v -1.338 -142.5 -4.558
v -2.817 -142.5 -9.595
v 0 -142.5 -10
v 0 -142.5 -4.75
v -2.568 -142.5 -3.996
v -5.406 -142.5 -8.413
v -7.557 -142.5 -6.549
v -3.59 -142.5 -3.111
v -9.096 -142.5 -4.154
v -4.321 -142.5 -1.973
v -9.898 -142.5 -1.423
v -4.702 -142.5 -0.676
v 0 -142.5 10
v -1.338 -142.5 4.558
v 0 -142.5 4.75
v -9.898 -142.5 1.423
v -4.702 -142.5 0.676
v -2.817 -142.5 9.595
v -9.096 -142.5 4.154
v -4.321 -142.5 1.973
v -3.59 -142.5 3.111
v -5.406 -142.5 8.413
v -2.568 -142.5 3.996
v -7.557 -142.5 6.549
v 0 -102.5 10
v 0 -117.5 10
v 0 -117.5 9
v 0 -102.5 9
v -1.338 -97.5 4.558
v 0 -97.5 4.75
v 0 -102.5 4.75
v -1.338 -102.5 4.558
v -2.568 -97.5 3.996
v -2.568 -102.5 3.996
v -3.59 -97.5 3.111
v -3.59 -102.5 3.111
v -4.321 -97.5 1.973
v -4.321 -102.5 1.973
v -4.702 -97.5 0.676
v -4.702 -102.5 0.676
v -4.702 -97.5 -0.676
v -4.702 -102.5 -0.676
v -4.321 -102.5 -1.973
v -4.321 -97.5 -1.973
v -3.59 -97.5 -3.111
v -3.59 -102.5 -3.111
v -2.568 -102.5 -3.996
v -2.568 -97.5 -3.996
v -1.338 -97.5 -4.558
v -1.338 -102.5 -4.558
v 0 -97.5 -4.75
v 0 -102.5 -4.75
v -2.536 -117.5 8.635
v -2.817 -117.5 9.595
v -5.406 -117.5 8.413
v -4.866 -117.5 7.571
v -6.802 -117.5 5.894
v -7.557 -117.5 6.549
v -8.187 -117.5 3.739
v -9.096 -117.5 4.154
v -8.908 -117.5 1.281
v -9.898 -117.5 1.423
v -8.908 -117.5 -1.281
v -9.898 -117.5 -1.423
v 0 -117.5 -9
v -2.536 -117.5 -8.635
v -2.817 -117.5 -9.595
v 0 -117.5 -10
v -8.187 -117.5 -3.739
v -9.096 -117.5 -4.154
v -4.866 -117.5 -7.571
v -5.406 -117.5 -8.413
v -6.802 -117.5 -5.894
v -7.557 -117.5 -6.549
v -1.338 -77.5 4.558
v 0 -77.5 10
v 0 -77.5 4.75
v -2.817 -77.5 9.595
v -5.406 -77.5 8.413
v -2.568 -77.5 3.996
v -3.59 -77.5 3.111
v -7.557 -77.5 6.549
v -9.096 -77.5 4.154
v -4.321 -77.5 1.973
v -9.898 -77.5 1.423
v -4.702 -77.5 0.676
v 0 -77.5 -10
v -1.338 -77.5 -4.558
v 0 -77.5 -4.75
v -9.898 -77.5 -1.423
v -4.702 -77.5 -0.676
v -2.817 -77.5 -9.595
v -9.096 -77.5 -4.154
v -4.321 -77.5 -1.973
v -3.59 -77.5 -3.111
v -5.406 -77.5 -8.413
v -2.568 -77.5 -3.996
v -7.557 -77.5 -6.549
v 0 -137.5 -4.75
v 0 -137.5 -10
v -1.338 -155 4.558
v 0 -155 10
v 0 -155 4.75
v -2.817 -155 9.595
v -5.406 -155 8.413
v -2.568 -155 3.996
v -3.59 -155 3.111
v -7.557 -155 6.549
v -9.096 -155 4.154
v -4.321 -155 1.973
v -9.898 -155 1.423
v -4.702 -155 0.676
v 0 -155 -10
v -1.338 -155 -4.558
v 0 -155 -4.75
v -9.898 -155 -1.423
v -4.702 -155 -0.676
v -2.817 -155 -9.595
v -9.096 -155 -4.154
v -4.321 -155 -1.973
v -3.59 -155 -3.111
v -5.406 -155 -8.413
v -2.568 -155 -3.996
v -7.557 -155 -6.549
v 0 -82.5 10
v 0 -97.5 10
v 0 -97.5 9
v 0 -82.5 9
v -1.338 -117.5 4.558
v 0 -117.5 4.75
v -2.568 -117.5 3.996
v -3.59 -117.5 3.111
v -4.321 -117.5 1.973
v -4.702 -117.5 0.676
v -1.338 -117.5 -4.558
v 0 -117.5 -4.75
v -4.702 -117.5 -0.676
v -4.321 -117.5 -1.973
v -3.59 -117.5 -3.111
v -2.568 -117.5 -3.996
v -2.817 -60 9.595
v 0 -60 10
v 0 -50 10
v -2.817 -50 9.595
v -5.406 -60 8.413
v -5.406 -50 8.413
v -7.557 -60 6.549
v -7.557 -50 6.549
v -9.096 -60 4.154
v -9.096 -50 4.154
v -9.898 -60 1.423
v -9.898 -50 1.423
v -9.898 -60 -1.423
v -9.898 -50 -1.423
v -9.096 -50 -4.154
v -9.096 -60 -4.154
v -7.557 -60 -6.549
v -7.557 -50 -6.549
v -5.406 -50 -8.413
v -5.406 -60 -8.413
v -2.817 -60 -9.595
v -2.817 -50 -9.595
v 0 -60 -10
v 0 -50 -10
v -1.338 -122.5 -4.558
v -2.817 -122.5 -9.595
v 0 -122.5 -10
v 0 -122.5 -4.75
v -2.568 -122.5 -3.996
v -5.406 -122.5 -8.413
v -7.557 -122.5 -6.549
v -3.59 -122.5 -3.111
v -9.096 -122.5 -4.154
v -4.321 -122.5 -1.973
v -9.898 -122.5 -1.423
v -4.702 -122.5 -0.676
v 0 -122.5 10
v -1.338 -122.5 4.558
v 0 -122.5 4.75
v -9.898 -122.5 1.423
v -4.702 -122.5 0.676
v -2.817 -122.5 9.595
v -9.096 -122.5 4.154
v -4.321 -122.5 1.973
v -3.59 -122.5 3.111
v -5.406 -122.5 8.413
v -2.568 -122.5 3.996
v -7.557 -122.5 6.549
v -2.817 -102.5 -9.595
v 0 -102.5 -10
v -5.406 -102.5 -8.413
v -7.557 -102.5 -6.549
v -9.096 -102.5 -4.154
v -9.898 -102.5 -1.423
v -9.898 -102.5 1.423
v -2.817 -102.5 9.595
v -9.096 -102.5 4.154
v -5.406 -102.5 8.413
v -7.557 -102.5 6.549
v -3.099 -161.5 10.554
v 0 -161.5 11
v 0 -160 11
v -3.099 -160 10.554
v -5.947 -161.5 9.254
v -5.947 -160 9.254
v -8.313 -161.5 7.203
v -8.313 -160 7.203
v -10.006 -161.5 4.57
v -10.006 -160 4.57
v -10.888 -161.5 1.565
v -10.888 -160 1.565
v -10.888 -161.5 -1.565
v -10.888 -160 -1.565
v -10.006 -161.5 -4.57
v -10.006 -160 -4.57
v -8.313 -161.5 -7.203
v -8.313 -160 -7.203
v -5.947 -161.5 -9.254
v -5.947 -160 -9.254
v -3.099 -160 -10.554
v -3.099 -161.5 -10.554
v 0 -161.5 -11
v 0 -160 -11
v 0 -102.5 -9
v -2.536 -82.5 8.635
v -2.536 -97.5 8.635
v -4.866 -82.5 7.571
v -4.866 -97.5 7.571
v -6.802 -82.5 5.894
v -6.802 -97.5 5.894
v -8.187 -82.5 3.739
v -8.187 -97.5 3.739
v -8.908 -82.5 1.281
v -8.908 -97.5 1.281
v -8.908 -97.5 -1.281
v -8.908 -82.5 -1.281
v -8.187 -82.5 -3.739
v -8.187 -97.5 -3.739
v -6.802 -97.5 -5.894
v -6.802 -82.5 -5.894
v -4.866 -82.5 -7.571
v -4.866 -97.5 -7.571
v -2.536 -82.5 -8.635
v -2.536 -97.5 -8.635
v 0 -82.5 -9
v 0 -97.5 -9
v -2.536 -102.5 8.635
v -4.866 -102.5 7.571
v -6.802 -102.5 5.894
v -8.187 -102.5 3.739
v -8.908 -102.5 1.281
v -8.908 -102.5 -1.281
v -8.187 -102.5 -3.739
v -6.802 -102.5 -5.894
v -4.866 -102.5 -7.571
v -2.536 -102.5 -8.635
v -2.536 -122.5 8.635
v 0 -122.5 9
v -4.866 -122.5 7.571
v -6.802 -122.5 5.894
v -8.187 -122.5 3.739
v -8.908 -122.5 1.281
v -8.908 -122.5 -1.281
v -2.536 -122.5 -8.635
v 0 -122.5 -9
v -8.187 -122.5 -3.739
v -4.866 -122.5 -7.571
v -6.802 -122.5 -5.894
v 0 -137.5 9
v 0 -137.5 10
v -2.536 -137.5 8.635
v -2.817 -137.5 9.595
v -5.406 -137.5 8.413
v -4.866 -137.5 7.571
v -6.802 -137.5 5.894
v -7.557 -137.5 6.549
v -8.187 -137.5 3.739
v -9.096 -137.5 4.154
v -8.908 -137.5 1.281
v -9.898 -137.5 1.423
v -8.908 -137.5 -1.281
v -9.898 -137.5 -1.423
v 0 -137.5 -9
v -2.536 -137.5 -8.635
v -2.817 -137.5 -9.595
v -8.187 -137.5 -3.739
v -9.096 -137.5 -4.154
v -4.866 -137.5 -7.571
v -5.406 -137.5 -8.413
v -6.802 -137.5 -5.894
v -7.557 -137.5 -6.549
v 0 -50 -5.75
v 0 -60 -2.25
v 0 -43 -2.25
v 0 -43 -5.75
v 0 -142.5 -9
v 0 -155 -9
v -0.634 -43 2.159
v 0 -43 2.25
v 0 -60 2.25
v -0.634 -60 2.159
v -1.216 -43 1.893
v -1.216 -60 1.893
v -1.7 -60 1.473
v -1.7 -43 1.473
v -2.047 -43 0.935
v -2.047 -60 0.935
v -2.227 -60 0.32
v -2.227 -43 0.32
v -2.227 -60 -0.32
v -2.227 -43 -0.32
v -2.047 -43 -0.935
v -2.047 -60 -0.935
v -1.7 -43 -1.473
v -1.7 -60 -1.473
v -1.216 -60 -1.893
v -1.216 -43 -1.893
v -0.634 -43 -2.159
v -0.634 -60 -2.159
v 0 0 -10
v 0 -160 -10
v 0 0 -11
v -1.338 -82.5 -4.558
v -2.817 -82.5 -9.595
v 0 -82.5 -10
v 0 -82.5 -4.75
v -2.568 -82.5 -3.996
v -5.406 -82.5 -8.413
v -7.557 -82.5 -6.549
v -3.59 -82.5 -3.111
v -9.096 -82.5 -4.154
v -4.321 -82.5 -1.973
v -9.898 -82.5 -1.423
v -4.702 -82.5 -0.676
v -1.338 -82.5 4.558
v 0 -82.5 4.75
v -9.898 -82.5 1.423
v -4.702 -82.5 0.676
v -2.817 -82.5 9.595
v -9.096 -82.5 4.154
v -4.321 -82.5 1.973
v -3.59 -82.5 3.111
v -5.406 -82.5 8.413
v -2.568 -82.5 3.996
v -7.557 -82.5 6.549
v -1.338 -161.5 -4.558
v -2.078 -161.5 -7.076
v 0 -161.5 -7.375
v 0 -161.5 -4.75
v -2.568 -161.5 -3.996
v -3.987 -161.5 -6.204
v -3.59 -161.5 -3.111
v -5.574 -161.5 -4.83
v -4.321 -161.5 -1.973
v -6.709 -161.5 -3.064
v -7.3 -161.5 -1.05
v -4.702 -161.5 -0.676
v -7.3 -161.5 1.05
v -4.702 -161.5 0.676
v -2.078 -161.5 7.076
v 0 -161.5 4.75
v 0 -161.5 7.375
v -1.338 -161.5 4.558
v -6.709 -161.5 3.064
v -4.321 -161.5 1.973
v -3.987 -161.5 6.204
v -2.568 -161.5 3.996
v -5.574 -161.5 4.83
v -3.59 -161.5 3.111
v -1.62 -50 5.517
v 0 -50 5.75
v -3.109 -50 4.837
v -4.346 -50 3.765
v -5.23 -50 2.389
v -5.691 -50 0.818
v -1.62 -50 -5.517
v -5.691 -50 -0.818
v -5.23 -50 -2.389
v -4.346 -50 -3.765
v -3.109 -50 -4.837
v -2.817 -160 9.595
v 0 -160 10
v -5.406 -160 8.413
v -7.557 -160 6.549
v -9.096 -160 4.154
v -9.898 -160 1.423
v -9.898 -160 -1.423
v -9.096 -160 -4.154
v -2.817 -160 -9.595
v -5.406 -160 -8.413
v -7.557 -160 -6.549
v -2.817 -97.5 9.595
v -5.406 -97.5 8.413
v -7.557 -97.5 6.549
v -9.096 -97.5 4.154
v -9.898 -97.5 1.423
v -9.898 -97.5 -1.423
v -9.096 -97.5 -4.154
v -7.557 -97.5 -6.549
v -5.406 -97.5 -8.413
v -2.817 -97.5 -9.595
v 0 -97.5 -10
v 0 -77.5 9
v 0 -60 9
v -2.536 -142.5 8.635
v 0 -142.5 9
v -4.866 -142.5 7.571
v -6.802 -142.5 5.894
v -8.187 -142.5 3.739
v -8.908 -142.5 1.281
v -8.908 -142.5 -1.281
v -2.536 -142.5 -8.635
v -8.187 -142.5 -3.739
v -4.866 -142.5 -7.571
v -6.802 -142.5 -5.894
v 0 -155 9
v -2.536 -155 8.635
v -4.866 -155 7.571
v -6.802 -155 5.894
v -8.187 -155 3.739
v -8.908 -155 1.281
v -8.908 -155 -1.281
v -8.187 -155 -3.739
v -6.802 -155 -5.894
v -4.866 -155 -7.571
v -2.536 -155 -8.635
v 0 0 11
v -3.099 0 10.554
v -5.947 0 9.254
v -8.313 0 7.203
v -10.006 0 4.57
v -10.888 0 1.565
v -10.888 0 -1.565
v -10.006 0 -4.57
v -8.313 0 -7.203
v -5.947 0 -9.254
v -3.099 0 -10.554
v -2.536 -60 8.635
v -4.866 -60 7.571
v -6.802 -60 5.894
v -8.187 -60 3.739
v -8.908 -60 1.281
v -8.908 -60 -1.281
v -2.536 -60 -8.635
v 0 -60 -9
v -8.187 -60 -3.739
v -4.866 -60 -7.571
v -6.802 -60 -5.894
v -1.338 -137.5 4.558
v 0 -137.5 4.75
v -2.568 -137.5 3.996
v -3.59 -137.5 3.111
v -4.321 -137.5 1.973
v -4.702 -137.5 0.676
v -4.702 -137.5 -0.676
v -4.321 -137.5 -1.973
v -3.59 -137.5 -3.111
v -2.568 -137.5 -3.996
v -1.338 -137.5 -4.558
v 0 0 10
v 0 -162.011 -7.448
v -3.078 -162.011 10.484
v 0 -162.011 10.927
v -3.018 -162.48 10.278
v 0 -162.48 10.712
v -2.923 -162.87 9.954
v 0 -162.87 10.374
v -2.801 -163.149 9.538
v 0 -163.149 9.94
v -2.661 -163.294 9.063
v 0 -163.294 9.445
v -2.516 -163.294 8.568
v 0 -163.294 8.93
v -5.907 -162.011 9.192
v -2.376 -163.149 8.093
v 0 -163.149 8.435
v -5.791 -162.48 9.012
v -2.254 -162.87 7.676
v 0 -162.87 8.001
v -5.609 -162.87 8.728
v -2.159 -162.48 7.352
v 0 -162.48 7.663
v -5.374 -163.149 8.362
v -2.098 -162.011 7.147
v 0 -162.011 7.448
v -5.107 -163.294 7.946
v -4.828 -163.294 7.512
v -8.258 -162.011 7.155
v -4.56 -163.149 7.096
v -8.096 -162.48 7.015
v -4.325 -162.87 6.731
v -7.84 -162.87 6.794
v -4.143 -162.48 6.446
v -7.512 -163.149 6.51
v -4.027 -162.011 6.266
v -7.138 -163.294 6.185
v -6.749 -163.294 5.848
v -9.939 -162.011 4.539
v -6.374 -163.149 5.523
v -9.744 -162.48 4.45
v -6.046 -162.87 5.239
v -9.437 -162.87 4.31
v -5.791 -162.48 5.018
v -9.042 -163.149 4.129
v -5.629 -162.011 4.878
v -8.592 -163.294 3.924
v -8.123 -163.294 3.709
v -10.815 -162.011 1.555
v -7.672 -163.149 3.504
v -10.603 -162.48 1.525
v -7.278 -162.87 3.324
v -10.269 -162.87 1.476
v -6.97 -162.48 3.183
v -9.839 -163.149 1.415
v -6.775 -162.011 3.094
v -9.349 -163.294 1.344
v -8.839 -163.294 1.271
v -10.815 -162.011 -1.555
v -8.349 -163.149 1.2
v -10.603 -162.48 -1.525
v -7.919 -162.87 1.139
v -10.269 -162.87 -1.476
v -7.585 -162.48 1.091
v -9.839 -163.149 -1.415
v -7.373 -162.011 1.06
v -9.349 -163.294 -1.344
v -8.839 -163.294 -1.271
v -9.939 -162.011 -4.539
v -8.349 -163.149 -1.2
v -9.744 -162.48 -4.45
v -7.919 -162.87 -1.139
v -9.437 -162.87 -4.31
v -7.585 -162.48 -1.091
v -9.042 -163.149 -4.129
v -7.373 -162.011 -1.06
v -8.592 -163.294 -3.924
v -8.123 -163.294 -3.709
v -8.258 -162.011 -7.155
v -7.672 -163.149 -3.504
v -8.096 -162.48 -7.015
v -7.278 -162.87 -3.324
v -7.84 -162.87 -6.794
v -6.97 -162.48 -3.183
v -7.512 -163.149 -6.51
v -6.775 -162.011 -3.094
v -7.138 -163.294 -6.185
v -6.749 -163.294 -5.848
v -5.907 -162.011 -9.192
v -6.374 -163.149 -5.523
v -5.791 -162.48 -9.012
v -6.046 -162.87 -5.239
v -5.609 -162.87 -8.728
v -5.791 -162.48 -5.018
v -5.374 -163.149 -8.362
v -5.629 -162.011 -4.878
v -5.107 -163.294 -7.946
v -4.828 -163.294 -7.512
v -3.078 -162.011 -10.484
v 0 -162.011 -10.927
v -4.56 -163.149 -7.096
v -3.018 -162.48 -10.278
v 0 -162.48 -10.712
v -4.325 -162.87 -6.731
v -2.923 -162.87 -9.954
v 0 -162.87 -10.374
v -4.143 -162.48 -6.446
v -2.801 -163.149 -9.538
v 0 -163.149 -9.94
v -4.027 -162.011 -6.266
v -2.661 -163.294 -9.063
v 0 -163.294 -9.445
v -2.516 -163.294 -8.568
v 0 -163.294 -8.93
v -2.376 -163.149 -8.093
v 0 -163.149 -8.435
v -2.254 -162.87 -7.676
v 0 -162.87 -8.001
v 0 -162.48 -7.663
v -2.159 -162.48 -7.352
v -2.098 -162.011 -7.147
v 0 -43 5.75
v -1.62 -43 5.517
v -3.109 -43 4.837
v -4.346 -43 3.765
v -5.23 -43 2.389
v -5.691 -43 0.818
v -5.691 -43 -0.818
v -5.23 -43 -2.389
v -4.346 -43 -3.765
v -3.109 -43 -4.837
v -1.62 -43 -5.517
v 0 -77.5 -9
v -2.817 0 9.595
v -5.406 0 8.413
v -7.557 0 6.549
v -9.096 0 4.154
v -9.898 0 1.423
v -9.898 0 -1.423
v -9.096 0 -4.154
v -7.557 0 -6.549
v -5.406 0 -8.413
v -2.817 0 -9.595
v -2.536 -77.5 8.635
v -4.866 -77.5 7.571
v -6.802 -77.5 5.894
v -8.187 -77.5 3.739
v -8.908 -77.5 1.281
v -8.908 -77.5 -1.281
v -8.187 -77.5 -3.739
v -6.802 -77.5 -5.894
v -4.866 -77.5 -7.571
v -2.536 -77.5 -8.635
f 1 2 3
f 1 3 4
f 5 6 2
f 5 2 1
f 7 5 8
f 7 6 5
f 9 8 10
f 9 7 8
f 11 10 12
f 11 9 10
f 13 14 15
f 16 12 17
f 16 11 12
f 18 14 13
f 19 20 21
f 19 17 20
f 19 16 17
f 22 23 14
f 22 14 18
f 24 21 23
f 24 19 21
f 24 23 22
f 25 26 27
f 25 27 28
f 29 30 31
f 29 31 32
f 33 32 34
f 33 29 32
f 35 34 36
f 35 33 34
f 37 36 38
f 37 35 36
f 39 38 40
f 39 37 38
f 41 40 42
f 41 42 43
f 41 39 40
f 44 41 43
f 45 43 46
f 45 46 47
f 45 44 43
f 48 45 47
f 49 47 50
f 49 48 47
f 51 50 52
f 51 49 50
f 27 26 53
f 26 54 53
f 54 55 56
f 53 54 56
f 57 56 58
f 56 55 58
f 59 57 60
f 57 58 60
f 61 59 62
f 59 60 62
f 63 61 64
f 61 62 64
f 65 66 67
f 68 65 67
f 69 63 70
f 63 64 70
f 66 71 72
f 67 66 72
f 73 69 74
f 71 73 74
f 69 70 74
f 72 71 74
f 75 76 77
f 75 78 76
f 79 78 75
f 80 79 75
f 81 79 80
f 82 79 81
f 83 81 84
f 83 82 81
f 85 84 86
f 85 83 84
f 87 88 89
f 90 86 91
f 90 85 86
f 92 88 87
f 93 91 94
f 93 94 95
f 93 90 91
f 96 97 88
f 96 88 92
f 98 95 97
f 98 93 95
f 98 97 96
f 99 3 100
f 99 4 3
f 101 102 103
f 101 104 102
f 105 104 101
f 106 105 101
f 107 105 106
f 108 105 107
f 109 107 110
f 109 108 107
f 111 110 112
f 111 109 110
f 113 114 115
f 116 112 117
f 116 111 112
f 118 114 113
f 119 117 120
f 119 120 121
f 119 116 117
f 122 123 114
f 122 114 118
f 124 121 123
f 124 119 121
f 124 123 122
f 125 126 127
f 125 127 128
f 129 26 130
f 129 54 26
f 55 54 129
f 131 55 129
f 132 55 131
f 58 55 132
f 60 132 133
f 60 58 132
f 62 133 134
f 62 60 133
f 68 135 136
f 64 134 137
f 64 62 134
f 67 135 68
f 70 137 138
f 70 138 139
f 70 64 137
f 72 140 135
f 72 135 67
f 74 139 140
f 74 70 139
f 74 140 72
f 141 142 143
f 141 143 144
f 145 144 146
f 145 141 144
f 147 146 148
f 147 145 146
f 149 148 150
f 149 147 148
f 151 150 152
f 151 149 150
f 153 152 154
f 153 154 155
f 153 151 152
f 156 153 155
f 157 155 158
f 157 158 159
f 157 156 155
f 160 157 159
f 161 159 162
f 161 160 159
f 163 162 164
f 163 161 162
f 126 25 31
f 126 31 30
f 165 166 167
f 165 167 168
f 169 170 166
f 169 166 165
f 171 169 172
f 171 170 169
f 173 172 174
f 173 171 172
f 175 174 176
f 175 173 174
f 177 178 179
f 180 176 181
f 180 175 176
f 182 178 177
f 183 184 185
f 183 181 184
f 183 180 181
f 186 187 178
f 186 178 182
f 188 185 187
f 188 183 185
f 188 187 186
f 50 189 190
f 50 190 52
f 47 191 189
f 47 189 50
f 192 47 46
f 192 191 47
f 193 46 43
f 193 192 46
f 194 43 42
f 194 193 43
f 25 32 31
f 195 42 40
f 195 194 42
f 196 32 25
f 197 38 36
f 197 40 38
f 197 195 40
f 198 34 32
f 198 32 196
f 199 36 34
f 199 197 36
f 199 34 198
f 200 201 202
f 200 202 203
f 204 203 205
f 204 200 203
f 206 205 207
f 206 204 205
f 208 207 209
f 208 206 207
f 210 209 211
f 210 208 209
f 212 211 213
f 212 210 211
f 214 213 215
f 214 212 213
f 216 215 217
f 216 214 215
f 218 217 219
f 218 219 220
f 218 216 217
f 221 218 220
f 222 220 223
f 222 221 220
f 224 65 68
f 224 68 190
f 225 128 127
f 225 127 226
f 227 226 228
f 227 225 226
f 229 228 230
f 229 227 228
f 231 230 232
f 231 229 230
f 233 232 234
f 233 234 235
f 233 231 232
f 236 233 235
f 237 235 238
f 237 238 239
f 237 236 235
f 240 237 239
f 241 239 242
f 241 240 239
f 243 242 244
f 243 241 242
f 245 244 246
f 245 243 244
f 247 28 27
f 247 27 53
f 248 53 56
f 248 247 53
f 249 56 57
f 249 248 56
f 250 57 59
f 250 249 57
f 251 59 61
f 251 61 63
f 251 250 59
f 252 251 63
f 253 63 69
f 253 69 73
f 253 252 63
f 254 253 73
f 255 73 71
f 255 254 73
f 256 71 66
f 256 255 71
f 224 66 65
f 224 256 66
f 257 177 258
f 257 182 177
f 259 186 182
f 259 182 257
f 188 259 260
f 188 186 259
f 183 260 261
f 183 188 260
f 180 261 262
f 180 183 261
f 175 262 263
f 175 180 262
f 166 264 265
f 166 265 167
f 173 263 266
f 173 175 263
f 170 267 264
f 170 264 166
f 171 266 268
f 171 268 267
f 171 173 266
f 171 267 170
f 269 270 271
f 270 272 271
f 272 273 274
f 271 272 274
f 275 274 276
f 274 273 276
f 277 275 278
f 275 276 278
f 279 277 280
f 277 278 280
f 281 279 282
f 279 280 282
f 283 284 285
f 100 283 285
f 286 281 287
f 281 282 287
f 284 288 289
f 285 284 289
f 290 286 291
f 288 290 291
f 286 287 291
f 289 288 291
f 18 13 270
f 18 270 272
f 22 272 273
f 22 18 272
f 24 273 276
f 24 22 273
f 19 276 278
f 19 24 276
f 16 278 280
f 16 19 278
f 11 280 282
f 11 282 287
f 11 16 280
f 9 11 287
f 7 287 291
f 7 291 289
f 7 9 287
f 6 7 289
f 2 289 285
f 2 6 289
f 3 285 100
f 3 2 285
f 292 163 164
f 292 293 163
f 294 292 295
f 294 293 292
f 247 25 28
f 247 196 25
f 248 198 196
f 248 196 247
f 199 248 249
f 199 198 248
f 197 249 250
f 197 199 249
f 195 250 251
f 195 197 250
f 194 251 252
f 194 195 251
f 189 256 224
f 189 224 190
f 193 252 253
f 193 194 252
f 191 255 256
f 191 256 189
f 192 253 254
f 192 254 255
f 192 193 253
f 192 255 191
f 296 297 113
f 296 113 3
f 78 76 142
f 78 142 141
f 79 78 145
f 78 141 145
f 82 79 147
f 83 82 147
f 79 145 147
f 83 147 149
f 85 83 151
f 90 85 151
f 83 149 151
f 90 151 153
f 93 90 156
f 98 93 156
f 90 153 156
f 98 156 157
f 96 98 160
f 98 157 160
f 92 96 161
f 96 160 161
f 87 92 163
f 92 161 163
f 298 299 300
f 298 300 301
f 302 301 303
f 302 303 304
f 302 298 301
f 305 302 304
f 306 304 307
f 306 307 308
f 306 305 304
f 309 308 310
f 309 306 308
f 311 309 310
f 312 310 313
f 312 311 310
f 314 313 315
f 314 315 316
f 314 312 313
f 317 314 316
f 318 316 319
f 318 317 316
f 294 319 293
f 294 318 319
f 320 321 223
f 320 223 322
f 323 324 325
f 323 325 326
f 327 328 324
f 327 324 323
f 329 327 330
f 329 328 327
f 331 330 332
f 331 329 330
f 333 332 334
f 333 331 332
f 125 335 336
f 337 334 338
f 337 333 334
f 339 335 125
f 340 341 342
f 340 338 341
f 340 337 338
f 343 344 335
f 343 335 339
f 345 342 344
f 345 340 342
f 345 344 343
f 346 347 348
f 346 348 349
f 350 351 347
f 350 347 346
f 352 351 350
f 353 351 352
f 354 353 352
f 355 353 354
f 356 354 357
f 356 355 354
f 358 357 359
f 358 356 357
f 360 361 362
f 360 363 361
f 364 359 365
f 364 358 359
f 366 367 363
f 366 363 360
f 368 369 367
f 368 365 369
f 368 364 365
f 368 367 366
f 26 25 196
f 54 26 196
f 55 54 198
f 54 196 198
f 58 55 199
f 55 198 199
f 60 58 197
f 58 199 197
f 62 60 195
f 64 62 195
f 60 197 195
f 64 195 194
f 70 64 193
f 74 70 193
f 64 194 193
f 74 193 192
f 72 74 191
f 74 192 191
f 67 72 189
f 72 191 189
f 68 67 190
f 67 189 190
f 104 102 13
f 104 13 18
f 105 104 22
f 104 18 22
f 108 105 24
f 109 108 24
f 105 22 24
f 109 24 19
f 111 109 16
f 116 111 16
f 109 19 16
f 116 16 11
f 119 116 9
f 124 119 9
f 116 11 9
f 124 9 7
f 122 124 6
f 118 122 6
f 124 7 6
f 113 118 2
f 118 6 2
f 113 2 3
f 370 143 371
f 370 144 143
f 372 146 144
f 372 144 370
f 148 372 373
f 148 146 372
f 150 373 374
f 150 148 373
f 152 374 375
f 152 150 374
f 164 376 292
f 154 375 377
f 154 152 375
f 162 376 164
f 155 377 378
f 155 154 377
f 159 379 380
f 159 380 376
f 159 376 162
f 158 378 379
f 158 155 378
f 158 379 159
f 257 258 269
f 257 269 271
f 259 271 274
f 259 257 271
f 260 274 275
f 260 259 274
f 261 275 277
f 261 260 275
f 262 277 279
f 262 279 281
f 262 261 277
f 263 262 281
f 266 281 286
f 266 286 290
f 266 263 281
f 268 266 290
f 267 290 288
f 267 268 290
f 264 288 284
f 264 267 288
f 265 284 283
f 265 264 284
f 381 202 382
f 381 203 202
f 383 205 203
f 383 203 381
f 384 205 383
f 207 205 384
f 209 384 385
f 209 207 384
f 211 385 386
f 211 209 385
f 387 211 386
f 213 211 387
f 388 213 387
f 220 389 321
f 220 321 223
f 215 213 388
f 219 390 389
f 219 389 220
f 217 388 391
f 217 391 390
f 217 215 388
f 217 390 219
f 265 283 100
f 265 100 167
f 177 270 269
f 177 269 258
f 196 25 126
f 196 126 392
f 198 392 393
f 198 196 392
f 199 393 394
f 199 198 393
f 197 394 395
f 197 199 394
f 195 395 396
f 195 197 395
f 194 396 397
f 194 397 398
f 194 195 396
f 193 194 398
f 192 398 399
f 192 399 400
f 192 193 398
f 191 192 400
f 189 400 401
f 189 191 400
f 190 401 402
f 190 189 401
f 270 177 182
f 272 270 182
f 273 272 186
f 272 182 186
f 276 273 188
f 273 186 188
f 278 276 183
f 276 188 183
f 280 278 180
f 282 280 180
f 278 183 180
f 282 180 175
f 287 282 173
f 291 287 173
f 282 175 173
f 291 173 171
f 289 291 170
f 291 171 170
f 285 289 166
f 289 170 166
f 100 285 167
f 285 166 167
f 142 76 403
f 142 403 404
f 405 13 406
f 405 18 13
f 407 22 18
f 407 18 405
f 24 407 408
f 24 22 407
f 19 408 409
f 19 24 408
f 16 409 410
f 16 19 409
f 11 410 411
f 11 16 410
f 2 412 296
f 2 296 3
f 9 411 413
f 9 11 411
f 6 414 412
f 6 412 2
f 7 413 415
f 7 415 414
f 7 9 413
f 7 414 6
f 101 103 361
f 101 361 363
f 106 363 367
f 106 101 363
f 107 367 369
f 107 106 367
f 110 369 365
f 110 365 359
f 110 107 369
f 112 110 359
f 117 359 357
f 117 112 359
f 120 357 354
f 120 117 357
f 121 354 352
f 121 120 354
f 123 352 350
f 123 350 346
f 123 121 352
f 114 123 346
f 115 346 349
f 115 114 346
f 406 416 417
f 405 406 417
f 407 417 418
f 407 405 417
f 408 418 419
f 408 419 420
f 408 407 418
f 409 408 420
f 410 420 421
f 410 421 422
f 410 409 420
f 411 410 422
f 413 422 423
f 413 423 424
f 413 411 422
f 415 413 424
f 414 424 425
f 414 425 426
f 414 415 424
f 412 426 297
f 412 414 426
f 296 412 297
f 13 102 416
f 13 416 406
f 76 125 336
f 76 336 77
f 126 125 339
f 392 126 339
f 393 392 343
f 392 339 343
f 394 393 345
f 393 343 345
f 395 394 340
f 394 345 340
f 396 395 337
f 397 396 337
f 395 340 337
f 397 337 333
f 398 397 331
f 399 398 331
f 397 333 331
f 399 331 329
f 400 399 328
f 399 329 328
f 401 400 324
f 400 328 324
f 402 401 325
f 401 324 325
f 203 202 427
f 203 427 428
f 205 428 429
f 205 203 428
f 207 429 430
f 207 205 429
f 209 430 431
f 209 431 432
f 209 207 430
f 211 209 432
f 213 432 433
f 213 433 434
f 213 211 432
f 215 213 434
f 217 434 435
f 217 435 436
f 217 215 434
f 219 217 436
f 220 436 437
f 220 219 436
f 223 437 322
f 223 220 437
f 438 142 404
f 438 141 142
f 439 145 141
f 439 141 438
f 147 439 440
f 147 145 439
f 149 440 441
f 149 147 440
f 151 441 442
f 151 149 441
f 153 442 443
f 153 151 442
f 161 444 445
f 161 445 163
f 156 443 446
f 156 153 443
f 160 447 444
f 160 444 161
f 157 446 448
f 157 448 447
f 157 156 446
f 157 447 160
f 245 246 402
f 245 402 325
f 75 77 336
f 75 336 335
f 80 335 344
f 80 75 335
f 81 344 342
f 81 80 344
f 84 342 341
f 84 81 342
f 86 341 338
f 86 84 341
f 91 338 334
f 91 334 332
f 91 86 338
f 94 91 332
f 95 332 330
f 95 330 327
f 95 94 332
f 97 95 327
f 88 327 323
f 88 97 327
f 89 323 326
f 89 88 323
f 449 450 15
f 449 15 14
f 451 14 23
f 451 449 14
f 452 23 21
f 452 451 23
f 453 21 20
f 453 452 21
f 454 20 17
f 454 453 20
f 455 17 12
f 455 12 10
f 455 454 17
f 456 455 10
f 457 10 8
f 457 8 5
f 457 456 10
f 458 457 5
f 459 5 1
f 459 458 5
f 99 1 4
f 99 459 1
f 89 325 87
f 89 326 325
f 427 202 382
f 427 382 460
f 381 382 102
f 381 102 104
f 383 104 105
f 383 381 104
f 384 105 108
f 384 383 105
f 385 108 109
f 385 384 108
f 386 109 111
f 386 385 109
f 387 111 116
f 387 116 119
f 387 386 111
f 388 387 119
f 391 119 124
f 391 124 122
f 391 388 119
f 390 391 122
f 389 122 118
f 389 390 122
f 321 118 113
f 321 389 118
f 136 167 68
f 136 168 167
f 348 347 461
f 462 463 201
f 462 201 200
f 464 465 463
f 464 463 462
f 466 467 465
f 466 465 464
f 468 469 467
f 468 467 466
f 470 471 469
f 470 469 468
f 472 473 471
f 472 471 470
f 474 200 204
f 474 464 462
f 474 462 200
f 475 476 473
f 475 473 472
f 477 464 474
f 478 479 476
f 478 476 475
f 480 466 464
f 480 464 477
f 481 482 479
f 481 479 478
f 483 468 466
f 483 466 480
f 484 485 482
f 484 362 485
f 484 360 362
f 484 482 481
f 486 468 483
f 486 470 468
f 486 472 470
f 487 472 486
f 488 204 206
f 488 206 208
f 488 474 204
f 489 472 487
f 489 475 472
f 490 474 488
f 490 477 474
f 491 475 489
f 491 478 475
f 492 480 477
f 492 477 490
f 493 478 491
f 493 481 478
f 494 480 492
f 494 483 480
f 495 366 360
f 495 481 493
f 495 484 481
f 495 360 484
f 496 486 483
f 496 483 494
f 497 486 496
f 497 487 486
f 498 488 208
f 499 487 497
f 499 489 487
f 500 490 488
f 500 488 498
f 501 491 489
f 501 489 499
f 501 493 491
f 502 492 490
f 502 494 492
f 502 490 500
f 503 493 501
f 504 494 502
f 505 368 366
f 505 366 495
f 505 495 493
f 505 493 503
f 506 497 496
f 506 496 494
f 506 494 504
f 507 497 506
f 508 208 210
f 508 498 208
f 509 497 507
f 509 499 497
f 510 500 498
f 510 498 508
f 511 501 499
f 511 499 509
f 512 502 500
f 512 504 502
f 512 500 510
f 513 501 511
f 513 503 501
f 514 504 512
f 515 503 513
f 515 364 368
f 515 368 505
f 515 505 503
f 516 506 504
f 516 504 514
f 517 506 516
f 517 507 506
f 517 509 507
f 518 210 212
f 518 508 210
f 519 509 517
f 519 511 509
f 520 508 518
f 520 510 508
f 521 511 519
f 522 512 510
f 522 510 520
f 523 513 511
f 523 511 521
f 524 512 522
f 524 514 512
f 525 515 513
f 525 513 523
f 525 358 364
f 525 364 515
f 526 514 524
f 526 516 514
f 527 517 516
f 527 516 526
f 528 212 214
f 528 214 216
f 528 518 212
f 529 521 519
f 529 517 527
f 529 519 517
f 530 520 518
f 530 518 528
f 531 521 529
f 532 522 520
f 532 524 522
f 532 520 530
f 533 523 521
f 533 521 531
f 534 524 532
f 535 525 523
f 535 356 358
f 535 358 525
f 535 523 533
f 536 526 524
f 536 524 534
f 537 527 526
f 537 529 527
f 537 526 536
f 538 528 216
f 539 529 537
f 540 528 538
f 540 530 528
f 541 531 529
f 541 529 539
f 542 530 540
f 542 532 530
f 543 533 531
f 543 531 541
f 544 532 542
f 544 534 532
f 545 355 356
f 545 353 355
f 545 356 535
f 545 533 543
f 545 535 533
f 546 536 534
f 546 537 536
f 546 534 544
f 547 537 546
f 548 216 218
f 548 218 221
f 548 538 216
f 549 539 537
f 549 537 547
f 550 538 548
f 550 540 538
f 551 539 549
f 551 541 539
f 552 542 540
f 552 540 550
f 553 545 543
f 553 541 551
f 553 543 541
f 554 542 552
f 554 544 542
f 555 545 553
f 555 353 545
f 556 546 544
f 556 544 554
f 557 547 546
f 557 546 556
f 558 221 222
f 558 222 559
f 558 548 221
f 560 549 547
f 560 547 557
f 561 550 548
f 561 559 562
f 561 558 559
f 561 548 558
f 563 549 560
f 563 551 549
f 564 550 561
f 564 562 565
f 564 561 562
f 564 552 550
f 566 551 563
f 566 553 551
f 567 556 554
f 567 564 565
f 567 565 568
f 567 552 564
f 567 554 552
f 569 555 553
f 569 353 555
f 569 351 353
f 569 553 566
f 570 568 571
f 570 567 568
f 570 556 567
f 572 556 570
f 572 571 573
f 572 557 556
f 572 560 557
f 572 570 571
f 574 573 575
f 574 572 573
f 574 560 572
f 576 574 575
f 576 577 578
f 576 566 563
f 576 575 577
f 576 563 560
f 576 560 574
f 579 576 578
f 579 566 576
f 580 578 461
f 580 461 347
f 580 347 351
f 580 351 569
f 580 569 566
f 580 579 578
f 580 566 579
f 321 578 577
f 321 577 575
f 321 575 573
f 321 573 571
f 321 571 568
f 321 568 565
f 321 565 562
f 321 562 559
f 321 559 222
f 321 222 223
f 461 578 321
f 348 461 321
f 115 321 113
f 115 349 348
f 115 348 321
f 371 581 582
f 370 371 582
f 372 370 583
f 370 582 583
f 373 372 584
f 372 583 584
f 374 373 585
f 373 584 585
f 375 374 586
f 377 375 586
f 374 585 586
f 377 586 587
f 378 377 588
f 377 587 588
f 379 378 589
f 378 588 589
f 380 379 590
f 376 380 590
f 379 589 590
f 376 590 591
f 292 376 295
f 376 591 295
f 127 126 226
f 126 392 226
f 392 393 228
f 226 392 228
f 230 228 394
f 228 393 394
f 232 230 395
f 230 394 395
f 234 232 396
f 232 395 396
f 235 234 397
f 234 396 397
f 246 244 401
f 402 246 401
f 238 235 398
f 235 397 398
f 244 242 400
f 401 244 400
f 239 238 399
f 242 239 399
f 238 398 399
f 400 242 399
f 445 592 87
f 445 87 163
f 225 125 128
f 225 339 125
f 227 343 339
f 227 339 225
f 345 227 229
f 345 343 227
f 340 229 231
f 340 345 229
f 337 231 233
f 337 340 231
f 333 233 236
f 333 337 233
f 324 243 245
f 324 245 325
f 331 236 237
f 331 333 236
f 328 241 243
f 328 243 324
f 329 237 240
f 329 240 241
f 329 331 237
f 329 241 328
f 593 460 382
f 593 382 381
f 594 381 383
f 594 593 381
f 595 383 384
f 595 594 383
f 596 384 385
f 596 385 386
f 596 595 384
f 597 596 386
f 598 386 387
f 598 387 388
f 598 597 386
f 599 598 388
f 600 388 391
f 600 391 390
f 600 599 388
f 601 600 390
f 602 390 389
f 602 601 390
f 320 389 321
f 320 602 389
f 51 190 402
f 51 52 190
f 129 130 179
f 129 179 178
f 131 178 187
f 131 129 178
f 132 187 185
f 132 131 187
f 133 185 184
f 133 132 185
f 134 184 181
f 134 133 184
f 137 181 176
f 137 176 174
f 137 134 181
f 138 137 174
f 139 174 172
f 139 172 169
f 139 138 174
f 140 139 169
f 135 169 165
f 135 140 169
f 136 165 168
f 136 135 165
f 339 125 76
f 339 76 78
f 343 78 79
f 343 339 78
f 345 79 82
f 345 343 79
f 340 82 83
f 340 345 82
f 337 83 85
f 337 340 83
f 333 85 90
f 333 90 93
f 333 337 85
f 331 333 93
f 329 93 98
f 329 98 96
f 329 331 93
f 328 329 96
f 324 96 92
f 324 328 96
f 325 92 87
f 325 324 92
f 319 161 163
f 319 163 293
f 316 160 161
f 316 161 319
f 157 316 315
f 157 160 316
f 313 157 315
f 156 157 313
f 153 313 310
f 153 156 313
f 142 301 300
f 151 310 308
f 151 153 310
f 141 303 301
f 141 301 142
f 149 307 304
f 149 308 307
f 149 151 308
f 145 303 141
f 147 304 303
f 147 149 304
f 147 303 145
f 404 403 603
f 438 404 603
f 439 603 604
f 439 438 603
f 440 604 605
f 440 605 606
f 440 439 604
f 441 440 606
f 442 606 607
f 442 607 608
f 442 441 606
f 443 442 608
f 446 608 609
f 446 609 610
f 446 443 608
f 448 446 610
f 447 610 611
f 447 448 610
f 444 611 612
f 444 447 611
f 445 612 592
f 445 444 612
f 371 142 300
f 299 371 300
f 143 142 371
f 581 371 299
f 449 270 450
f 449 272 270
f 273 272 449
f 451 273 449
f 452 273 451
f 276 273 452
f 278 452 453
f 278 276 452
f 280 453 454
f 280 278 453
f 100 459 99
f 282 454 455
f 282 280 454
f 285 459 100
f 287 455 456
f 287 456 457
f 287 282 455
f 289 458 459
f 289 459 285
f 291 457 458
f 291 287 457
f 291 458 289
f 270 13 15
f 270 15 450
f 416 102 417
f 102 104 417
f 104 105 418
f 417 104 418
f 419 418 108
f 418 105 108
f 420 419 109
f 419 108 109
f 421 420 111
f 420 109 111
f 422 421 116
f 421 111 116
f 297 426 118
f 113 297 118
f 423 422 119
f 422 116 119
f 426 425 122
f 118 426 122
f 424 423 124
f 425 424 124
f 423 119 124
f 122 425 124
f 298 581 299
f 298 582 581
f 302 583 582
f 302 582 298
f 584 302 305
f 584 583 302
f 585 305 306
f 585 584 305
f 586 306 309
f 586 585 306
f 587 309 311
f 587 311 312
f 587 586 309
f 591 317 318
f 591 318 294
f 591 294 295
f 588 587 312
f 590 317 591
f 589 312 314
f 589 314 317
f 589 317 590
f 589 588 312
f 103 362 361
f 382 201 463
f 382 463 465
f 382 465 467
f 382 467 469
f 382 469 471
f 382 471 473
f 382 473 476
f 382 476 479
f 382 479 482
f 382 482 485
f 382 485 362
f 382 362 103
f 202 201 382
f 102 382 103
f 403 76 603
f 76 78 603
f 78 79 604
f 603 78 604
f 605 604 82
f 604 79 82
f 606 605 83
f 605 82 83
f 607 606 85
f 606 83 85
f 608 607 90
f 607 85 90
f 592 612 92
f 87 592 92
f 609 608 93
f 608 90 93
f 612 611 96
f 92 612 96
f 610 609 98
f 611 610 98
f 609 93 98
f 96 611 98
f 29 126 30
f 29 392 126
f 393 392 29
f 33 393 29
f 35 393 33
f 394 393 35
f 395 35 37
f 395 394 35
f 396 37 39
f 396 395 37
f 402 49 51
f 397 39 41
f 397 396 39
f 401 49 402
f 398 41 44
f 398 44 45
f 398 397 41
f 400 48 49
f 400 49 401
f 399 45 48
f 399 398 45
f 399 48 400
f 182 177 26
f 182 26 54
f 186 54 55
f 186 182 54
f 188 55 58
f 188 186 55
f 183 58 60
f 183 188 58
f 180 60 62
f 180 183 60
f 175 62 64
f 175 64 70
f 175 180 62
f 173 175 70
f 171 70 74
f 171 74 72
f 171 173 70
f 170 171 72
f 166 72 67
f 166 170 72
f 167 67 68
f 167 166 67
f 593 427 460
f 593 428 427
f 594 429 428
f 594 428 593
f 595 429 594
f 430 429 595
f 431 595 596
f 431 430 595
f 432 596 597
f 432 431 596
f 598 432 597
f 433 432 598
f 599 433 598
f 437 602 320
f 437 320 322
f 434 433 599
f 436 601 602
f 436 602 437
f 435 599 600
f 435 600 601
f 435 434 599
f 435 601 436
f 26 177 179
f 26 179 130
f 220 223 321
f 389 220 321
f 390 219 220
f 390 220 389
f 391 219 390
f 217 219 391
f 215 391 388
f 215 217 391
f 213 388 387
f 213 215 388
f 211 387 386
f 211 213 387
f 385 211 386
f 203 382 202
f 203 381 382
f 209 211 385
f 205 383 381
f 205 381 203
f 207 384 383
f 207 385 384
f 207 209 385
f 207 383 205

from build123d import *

# Parameters (mm, degrees)
F0_W     = 17.5
F0_H     = 1
F0_W_2   = 15
F0_W_3   = 12.5
F0_W_4   = 7
F0_H_2   = 3.5
F4_W     = 190.327004
F4_H     = 38.759522
F5_DEPTH = 25


with BuildPart() as f1:
    # F0 (on Right) → F1 (revolve)
    with BuildSketch(Plane.YZ):
        Polygon((0, 10), (0, 11), (-160, 11), (-160, 10), (-155, 10), (-142.5, 10), (-137.5, 10), (-122.5, 10), (-117.5, 10), (-102.5, 10), (-97.5, 10), (-82.5, 10), (-77.5, 10), (-60, 10), (-50, 10), align=None)
    revolve(axis=Axis((0, -80, 0), (0, -1, 0)))


with BuildPart() as f2:
    # F0 (on Right) → F2 (revolve)
    with BuildSketch(Plane.YZ):
        with Locations((-68.75, 9.5)):
            Rectangle(F0_W, F0_H)
        with Locations((-90, 9.5)):
            Rectangle(F0_W_2, F0_H)
        with Locations((-110, 9.5)):
            Rectangle(F0_W_2, F0_H)
        with Locations((-148.75, 9.5)):
            Rectangle(F0_W_3, F0_H)
        with Locations((-130, 9.5)):
            Rectangle(F0_W_2, F0_H)
    revolve(axis=Axis((0, -80, 0), (0, -1, 0)))


with BuildPart() as f3:
    # F0 (on Right) → F3 (revolve)
    with BuildSketch(Plane.YZ):
        Polygon((-50, 5.75), (-50, 10), (-60, 10), (-60, 9), (-60, 2.25), (-50, 2.25), align=None)
        Polygon((-77.5, 9), (-77.5, 10), (-82.5, 10), (-82.5, 9), (-82.5, 4.75), (-77.5, 4.75), align=None)
        Polygon((-97.5, 9), (-97.5, 10), (-102.5, 10), (-102.5, 9), (-102.5, 4.75), (-97.5, 4.75), align=None)
        Polygon((-117.5, 10), (-122.5, 10), (-122.5, 9), (-122.5, 4.75), (-117.5, 4.75), (-117.5, 9), align=None)
        Polygon((-137.5, 10), (-142.5, 10), (-142.5, 9), (-142.5, 4.75), (-137.5, 4.75), (-137.5, 9), align=None)
        Polygon((-155, 10), (-160, 10), (-160, 7.375), (-160, 4.75), (-155, 4.75), (-155, 9), align=None)
        with Locations((-46.5, 4)):
            Rectangle(F0_W_4, F0_H_2)
        Polygon((-160, 10), (-160, 11), (-161.5, 11), (-161.5, 7.375), (-161.5, 4.75), (-160, 4.75), (-160, 7.375), align=None)
        with BuildLine():
            Line((-161.5, 7.375), (-161.5, 11))
            ThreePointArc((-161.5, 11), (-163.3125, 9.1875), (-161.5, 7.375))
        make_face()
    revolve(axis=Axis((0, -80, 0), (0, -1, 0)))


with BuildPart() as f5_tool:
    # F4 (on Right) → F5 (new body)
    with BuildSketch(Plane.YZ):
        with Locations((-79.199292, 0.402637)):
            Rectangle(F4_W, F4_H)
    extrude(amount=F5_DEPTH)


with BuildPart() as f1_1:
    add(f1.part)

    # F5: cut by f5_tool
    add(f5_tool.part, mode=Mode.SUBTRACT)


with BuildPart() as f2_1:
    add(f2.part)

    # F5: cut by f5_tool
    add(f5_tool.part, mode=Mode.SUBTRACT)


with BuildPart() as f3_1:
    add(f3.part)

    # F5: cut by f5_tool
    add(f5_tool.part, mode=Mode.SUBTRACT)


solid = Compound([f1_1.part, f2_1.part, f3_1.part])
